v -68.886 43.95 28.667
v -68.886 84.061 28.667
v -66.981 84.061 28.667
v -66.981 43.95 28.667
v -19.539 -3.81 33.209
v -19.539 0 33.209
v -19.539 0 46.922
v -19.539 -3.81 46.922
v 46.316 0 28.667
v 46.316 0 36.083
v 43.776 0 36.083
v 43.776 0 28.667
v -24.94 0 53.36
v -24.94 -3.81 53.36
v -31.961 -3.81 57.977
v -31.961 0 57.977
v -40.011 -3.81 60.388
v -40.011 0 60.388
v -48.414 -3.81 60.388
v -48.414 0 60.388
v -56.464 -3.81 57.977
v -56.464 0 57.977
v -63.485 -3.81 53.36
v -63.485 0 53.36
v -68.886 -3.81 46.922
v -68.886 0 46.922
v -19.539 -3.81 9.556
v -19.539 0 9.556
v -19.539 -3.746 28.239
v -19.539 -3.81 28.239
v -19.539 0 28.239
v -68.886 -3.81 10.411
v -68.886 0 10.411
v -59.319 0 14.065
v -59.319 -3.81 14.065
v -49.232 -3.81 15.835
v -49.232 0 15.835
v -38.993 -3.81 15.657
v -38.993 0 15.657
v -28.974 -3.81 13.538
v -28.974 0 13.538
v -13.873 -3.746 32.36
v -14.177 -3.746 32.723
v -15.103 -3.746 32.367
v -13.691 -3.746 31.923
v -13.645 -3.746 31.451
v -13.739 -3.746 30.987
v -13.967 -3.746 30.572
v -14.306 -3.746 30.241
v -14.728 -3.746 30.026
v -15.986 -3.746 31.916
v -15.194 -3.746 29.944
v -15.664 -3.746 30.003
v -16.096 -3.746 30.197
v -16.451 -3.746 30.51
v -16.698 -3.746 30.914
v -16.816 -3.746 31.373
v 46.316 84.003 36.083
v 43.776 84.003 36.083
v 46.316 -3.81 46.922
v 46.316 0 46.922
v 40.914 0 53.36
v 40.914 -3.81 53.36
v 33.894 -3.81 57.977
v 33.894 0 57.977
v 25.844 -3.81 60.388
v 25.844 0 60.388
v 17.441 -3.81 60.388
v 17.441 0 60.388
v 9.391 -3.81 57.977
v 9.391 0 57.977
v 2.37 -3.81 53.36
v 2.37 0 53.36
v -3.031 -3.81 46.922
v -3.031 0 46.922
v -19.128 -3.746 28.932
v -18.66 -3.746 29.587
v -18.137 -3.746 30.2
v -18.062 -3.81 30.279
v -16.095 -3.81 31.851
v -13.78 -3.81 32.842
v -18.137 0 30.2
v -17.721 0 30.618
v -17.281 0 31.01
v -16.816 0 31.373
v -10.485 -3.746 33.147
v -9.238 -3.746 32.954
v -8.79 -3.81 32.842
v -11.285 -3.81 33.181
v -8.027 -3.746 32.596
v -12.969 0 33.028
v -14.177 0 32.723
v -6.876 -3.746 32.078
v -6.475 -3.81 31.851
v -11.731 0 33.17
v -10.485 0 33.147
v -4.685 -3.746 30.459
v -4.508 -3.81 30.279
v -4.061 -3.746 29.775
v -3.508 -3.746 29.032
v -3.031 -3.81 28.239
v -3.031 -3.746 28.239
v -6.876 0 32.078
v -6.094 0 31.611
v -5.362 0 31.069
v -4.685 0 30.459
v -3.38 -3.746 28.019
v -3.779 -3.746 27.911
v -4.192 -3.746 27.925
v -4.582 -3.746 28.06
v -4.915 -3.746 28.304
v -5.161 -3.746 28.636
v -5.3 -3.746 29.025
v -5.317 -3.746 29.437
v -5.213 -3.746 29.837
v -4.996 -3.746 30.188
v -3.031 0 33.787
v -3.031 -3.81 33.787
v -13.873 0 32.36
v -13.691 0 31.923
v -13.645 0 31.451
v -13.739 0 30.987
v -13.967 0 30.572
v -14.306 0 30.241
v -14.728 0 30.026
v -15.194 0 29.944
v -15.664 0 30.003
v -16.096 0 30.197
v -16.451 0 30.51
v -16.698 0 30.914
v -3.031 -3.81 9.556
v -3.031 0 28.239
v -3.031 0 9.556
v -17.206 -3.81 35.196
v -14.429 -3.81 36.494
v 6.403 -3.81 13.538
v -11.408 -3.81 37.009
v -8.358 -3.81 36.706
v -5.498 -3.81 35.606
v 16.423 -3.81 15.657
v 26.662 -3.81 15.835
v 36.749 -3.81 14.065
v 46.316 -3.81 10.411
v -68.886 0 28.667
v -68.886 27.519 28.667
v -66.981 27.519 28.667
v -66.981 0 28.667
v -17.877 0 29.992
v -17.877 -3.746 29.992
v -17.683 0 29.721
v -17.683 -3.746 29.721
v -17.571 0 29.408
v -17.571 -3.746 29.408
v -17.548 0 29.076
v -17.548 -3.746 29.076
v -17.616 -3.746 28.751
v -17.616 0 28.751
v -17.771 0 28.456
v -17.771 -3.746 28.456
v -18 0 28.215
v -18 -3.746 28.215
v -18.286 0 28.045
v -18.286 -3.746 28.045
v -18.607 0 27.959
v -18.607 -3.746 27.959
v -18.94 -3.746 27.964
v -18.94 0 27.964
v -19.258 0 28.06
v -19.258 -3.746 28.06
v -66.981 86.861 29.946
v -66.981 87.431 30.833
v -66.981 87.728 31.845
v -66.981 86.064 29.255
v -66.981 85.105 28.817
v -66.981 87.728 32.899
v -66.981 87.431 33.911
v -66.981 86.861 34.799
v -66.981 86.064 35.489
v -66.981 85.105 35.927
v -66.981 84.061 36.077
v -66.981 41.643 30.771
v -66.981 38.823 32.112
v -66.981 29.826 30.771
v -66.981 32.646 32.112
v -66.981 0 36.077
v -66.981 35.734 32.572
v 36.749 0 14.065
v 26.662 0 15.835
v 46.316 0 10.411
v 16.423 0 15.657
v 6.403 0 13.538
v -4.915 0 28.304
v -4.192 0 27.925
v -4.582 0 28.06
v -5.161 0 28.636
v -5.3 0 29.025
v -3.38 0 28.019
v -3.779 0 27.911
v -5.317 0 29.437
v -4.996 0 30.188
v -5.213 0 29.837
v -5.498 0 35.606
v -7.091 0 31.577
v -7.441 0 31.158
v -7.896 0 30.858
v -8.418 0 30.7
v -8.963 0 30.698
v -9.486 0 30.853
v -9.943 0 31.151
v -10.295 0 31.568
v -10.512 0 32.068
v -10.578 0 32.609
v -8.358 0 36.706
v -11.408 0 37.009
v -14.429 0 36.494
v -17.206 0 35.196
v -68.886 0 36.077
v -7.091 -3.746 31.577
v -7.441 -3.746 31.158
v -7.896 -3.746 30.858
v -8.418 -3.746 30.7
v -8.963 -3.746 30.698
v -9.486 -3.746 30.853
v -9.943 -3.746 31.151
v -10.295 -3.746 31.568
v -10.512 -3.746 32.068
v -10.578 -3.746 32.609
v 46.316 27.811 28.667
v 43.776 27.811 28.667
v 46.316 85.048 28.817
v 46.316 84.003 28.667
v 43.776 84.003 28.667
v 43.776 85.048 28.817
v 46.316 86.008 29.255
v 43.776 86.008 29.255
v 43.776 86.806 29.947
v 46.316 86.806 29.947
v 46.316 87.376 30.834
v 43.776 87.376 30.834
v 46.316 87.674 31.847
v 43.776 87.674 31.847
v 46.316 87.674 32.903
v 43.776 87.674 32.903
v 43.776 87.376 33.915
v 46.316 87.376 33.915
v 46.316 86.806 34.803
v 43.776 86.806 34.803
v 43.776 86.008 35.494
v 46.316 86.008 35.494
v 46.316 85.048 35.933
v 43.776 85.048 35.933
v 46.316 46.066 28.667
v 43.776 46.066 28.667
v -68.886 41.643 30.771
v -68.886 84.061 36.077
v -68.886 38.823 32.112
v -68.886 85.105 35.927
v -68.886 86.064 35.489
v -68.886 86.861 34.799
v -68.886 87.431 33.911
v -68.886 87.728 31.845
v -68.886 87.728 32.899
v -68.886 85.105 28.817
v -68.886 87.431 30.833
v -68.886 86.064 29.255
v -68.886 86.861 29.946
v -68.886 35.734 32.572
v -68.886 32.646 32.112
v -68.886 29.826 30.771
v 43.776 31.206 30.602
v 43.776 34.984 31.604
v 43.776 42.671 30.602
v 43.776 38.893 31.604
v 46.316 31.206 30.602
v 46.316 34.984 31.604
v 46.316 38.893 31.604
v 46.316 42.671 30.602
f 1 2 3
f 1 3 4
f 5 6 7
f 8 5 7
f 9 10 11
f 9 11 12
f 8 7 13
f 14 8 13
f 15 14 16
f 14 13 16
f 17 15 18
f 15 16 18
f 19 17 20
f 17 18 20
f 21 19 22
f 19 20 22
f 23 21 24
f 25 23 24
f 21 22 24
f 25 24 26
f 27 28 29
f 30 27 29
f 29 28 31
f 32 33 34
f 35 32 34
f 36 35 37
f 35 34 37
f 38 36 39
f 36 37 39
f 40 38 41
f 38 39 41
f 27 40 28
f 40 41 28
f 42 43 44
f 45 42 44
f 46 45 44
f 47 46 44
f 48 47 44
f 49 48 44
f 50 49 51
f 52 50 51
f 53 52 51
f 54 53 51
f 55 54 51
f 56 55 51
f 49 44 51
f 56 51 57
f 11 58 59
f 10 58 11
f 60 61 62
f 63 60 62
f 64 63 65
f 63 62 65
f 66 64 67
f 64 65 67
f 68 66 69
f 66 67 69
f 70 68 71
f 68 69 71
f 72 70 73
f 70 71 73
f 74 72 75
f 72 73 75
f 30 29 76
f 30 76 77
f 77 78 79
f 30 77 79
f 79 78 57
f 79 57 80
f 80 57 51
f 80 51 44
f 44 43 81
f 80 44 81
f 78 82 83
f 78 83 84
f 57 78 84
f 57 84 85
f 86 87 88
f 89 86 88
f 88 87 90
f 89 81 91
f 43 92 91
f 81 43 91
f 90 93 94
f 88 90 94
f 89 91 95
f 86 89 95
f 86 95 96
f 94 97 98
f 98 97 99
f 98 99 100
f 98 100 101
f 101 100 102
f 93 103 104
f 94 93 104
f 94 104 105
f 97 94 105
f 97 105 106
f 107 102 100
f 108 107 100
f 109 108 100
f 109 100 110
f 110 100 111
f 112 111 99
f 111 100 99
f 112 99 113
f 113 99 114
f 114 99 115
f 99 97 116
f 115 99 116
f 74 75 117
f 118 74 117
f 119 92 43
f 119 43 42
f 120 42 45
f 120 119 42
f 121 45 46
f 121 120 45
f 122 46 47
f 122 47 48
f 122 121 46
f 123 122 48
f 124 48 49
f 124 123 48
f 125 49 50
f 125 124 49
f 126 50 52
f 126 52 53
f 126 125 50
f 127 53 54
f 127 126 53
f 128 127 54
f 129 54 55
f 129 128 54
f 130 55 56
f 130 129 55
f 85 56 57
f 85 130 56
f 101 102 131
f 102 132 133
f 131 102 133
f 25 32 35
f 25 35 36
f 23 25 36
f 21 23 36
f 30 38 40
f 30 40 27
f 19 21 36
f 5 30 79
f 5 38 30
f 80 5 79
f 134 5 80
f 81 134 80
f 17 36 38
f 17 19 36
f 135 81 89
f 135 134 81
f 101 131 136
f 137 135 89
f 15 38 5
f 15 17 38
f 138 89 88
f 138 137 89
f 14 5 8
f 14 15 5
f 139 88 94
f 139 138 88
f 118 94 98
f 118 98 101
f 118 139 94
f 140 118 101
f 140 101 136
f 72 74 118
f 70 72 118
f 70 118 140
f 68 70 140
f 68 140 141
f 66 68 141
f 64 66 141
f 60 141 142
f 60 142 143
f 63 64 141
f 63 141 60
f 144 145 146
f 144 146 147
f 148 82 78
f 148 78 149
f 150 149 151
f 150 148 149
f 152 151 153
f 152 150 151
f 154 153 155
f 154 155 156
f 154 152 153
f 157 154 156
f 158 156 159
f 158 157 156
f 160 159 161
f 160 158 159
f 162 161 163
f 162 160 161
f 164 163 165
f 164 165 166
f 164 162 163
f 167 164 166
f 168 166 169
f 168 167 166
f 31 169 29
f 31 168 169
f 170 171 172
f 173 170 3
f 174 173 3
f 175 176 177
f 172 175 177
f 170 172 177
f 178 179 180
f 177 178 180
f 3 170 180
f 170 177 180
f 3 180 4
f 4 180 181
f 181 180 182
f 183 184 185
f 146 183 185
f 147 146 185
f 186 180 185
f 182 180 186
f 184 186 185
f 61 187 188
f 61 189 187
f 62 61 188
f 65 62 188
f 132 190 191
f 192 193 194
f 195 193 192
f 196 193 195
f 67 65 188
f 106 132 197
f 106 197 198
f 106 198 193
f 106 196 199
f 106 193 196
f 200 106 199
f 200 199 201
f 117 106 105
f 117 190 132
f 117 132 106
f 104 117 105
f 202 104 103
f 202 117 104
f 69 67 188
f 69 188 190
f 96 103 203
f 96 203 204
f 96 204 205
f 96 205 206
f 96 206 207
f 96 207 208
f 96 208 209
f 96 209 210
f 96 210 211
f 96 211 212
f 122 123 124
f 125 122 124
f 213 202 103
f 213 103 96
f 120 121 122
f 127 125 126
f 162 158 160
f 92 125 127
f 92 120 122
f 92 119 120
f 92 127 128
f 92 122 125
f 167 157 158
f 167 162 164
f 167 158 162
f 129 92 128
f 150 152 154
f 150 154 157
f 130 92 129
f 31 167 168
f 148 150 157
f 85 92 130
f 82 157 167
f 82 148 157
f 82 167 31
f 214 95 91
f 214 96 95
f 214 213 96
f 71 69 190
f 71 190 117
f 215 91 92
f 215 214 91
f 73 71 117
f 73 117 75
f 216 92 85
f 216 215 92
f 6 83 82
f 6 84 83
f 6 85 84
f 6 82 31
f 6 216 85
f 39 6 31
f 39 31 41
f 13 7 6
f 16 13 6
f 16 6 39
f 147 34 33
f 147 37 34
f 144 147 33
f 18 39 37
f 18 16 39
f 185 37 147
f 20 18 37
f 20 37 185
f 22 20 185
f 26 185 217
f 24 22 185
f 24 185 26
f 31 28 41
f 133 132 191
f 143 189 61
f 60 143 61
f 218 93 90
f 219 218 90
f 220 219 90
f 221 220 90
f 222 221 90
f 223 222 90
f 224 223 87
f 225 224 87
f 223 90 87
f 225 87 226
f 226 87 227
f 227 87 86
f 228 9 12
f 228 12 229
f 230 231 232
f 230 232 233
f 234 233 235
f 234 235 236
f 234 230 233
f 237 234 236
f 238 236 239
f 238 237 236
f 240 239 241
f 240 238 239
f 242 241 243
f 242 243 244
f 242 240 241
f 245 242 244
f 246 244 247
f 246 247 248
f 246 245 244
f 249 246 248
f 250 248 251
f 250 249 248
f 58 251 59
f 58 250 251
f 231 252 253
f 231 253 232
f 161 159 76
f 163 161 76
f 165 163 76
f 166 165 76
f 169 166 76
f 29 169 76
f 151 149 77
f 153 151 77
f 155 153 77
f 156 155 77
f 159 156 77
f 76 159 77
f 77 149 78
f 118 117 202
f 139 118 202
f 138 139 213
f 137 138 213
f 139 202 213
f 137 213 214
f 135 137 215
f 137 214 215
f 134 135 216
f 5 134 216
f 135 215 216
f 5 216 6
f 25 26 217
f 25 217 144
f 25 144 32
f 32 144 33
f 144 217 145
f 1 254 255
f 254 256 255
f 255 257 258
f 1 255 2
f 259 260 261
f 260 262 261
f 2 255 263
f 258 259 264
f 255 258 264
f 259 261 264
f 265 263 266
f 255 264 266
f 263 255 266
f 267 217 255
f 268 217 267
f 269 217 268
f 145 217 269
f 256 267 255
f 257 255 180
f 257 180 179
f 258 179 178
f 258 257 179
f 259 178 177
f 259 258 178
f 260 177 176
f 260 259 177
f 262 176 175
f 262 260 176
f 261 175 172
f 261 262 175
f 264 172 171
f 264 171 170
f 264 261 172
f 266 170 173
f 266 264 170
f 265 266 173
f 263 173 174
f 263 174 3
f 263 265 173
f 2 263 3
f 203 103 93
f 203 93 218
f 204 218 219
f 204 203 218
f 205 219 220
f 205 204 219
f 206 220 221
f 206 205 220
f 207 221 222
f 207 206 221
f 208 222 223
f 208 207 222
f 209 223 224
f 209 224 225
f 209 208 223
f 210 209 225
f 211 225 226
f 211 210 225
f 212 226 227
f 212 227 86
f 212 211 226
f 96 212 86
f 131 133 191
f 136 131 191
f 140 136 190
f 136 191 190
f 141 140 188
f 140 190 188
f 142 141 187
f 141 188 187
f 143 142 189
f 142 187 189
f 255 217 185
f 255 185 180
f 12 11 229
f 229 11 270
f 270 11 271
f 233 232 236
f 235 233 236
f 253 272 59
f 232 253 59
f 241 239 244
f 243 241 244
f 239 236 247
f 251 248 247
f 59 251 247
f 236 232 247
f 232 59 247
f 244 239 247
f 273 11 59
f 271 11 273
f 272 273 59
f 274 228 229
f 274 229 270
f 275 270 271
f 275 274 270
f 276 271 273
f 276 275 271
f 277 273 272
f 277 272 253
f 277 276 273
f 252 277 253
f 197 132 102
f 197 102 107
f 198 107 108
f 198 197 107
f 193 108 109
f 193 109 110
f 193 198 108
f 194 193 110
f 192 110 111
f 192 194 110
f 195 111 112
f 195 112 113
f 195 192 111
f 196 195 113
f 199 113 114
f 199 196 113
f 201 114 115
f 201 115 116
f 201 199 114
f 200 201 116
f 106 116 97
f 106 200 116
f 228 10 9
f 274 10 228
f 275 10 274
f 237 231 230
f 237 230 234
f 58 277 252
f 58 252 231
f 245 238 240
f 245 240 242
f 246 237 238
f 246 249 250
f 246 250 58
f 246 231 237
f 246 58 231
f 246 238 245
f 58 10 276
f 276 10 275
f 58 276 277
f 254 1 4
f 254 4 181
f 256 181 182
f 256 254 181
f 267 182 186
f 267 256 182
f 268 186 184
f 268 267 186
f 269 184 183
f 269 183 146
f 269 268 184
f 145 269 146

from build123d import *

# Parameters (mm, degrees)
F1_DEPTH = 3.81
F3_DEPTH = 2.54
F5_DEPTH = 1.905
F7_DEPTH = 3.7465


with BuildPart() as f1:
    # F0 (on Front) → F1 (new body)
    with BuildSketch(Plane.XZ):
        with BuildLine():
            ThreePointArc((-68.8856169581, 10.4112839326), (-44.1081304529, 15.9905487889), (-19.5389837027, 9.555561468))
            Line((-19.5389837027, 9.555561468), (-19.5389837027, 28.2388245687))
            Line((-19.5389837027, 28.2388245687), (-19.5389837027, 33.2089811563))
            Line((-19.5389837027, 33.2089811563), (-19.5389837027, 46.9220876694))
            ThreePointArc((-19.5389837027, 46.9220876694), (-44.2123003304, 60.6937658633), (-68.8856169581, 46.9220876694))
            Line((-68.8856169581, 46.9220876694), (-68.8856169581, 10.4112839326))
        make_face()
        with BuildLine():
            Line((-19.5389837027, 33.2089811563), (-19.5389837027, 28.2388245687))
            ThreePointArc((-19.5389837027, 28.2388245687), (-11.2850265577, 33.181026292), (-3.0310694128, 28.2388245687))
            Line((-3.0310694128, 28.2388245687), (-3.0310694128, 33.7874628603))
            ThreePointArc((-3.0310694128, 33.7874628603), (-11.4080671733, 37.0093856655), (-19.5389837027, 33.2089811563))
        make_face()
        with BuildLine():
            Line((-3.0310694128, 33.7874628603), (-3.0310694128, 28.2388245687))
            Line((-3.0310694128, 28.2388245687), (-3.0310694128, 9.555561468))
            ThreePointArc((-3.0310694128, 9.555561468), (21.5380773374, 15.9905487889), (46.3155638427, 10.4112839326))
            Line((46.3155638427, 10.4112839326), (46.3155638427, 46.9220876694))
            ThreePointArc((46.3155638427, 46.9220876694), (21.6422472149, 60.6937658633), (-3.0310694128, 46.9220876694))
            Line((-3.0310694128, 46.9220876694), (-3.0310694128, 33.7874628603))
        make_face()
    extrude(amount=F1_DEPTH)

    # F4 (on face) → F5 (join)
    with BuildSketch(Plane(origin=(-68.8856169581, 0, 0), x_dir=(0, -1, 0), z_dir=(-1, 0, 0))):
        with BuildLine():
            Line((0, 28.666685801), (0, 36.0773615539))
            Line((0, 36.0773615539), (-84.0607136488, 36.0773615539))
            ThreePointArc((-84.0607136488, 36.0773615539), (-87.7660515253, 32.3720236775), (-84.0607136488, 28.666685801))
            Line((-84.0607136488, 28.666685801), (-43.9497493207, 28.666685801))
            ThreePointArc((-43.9497493207, 28.666685801), (-35.7344048098, 32.5721302641), (-27.5190602988, 28.666685801))
            Line((-27.5190602988, 28.666685801), (0, 28.666685801))
        make_face()
    extrude(amount=-F5_DEPTH)

    # F6 (on face) → F7 (join)
    with BuildSketch(Plane(origin=(0, 0, 0), x_dir=(-1, 0, 0), z_dir=(0, 1, 0))):
        with BuildLine():
            ThreePointArc((10.4850491791, 33.1467905871), (8.6264920964, 32.795687018), (6.8764129189, 32.0782394464))
            ThreePointArc((6.8764129189, 32.0782394464), (9.2302432397, 30.7567408368), (10.4850491791, 33.1467905871))
        make_face()
        with BuildLine():
            ThreePointArc((4.6847159658, 30.4591629776), (3.7753798842, 29.4104470252), (3.0310694128, 28.2388245687))
            ThreePointArc((3.0310694128, 28.2388245687), (5.0505286179, 28.4607515645), (4.6847159658, 30.4591629776))
        make_face()
        with BuildLine():
            ThreePointArc((16.8159558735, 31.3729320461), (15.5501344197, 32.1532387716), (14.1767474713, 32.7233184401))
            ThreePointArc((14.1767474713, 32.7233184401), (14.5086800909, 30.117810225), (16.8159558735, 31.3729320461))
        make_face()
        with BuildLine():
            ThreePointArc((19.5389837027, 28.2388245687), (18.9011472937, 29.2645692329), (18.1365737962, 30.1996707075))
            ThreePointArc((18.1365737962, 30.1996707075), (17.770603097, 28.4559966735), (19.5389837027, 28.2388245687))
        make_face()
    extrude(amount=-F7_DEPTH)


with BuildPart() as f3:
    # F2 (on face) → F3 (new body)
    with BuildSketch(Plane.YZ.offset(46.3155638427)):
        with BuildLine():
            Line((27.8109610081, 36.0829420388), (0, 36.0829420388))
            Line((0, 36.0829420388), (0, 28.666685801))
            Line((0, 28.666685801), (27.8109610081, 28.666685801))
            ThreePointArc((27.8109610081, 28.666685801), (36.9386617094, 31.7302999676), (46.0663624108, 28.666685801))
            Line((46.0663624108, 28.666685801), (84.0033665299, 28.666685801))
            ThreePointArc((84.0033665299, 28.666685801), (87.7114946488, 32.3748139199), (84.0033665299, 36.0829420388))
            Line((84.0033665299, 36.0829420388), (27.8109610081, 36.0829420388))
        make_face()
    extrude(amount=-F3_DEPTH)


solid = Compound([f1.part, f3.part])
